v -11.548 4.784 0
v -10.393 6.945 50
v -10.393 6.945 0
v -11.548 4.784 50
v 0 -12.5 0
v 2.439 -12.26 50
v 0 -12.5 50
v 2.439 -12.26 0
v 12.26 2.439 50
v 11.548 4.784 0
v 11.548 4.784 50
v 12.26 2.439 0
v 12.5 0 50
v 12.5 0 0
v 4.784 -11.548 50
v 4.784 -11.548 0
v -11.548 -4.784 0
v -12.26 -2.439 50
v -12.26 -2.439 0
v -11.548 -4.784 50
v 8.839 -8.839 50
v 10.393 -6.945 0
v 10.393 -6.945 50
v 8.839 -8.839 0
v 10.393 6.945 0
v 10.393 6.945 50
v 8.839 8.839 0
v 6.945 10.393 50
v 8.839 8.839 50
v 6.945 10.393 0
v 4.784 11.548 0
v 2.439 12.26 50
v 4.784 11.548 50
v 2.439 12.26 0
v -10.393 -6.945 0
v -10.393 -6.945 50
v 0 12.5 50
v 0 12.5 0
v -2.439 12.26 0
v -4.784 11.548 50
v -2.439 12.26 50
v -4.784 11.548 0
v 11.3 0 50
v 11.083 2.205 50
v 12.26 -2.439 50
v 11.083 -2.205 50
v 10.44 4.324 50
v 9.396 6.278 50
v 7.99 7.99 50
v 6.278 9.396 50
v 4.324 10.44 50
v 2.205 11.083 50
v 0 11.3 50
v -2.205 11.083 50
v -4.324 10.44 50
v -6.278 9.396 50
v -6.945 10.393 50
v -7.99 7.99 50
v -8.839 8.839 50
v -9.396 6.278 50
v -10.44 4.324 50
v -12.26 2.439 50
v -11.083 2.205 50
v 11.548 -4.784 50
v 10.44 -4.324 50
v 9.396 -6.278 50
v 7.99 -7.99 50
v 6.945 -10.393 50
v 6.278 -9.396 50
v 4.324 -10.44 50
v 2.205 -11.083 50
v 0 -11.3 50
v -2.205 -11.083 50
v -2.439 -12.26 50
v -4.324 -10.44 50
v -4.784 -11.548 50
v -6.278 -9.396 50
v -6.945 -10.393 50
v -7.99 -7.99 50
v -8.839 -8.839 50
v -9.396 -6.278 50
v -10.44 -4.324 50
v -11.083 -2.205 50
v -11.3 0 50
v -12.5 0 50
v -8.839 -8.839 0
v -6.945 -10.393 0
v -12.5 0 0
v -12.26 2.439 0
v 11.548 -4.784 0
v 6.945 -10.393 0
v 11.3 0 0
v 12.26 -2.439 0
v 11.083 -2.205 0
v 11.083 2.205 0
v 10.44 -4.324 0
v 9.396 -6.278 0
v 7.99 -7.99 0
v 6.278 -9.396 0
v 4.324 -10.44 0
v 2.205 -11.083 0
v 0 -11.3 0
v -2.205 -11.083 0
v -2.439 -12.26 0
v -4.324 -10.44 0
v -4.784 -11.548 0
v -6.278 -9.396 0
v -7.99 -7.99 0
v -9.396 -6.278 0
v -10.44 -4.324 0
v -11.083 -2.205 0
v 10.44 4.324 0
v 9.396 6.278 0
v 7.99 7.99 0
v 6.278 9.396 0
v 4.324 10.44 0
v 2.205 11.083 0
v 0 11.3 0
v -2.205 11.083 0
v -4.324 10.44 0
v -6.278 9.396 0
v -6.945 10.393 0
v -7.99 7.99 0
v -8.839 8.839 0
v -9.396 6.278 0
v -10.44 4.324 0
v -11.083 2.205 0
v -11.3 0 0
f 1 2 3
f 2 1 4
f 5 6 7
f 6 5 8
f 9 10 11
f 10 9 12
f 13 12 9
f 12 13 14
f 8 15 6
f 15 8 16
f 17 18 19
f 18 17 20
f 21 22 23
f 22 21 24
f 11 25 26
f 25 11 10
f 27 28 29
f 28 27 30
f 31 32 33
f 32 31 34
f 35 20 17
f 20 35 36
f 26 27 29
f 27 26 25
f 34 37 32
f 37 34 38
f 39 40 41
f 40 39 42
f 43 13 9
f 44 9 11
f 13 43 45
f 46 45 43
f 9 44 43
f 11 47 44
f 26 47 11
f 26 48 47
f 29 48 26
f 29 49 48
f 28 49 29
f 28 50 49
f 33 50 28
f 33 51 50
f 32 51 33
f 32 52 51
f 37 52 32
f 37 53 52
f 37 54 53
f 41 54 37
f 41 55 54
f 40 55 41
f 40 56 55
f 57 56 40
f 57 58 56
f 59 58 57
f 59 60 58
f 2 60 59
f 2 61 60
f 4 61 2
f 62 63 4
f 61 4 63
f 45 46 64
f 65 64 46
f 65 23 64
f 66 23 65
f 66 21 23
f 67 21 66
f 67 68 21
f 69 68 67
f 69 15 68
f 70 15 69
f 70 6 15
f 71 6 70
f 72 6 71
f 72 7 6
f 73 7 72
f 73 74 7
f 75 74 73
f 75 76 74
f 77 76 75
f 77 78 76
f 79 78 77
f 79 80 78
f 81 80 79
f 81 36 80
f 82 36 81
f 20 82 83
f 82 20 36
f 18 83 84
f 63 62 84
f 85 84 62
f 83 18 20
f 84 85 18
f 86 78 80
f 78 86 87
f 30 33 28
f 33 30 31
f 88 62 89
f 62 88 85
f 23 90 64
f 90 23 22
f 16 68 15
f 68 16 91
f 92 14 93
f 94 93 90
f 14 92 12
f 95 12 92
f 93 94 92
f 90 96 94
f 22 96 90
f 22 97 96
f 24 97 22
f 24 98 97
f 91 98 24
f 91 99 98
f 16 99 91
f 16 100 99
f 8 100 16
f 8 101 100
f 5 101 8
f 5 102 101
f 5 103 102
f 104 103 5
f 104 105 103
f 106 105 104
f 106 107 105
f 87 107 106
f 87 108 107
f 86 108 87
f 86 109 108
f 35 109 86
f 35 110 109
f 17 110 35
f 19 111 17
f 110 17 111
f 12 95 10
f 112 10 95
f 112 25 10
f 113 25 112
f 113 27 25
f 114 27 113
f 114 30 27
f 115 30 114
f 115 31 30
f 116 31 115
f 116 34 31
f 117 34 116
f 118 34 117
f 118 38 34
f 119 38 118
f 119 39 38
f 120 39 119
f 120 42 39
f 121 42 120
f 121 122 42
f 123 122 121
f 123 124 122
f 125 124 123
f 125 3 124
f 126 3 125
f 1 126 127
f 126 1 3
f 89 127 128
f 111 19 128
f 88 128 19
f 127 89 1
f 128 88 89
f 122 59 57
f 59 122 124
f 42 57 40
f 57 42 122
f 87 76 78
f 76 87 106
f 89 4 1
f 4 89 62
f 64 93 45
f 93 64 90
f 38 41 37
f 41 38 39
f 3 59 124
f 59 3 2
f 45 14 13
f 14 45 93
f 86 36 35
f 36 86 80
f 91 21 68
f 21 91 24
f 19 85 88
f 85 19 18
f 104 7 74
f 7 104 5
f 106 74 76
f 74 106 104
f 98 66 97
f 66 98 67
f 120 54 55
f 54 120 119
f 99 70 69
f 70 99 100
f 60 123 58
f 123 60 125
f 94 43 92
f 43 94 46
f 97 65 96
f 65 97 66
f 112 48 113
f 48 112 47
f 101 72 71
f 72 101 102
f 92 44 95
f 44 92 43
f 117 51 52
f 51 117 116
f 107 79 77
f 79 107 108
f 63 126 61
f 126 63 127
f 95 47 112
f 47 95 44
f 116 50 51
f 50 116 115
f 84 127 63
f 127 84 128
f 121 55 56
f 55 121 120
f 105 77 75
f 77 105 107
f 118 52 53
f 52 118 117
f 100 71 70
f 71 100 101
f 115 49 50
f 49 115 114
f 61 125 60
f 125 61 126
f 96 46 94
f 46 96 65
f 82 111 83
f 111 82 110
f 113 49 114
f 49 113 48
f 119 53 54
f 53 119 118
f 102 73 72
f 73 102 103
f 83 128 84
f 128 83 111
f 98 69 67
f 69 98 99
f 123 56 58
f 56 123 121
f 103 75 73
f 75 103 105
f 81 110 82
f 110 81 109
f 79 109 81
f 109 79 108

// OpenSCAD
$fn = 32;

// ----------------------------------------------------------------------
// Thin tube: 1.2 mm wall
// ----------------------------------------------------------------------

// --- parameters (mm) ---
tube_od = 25;             // outer diameter
tube_h = 50;              // height, Z
wall = 1.2;               // wall thickness

difference() {
  cylinder(h = tube_h, d = tube_od);
  translate([0, 0, -1]) cylinder(h = tube_h + 2, d = tube_od - 2 * wall);
}
